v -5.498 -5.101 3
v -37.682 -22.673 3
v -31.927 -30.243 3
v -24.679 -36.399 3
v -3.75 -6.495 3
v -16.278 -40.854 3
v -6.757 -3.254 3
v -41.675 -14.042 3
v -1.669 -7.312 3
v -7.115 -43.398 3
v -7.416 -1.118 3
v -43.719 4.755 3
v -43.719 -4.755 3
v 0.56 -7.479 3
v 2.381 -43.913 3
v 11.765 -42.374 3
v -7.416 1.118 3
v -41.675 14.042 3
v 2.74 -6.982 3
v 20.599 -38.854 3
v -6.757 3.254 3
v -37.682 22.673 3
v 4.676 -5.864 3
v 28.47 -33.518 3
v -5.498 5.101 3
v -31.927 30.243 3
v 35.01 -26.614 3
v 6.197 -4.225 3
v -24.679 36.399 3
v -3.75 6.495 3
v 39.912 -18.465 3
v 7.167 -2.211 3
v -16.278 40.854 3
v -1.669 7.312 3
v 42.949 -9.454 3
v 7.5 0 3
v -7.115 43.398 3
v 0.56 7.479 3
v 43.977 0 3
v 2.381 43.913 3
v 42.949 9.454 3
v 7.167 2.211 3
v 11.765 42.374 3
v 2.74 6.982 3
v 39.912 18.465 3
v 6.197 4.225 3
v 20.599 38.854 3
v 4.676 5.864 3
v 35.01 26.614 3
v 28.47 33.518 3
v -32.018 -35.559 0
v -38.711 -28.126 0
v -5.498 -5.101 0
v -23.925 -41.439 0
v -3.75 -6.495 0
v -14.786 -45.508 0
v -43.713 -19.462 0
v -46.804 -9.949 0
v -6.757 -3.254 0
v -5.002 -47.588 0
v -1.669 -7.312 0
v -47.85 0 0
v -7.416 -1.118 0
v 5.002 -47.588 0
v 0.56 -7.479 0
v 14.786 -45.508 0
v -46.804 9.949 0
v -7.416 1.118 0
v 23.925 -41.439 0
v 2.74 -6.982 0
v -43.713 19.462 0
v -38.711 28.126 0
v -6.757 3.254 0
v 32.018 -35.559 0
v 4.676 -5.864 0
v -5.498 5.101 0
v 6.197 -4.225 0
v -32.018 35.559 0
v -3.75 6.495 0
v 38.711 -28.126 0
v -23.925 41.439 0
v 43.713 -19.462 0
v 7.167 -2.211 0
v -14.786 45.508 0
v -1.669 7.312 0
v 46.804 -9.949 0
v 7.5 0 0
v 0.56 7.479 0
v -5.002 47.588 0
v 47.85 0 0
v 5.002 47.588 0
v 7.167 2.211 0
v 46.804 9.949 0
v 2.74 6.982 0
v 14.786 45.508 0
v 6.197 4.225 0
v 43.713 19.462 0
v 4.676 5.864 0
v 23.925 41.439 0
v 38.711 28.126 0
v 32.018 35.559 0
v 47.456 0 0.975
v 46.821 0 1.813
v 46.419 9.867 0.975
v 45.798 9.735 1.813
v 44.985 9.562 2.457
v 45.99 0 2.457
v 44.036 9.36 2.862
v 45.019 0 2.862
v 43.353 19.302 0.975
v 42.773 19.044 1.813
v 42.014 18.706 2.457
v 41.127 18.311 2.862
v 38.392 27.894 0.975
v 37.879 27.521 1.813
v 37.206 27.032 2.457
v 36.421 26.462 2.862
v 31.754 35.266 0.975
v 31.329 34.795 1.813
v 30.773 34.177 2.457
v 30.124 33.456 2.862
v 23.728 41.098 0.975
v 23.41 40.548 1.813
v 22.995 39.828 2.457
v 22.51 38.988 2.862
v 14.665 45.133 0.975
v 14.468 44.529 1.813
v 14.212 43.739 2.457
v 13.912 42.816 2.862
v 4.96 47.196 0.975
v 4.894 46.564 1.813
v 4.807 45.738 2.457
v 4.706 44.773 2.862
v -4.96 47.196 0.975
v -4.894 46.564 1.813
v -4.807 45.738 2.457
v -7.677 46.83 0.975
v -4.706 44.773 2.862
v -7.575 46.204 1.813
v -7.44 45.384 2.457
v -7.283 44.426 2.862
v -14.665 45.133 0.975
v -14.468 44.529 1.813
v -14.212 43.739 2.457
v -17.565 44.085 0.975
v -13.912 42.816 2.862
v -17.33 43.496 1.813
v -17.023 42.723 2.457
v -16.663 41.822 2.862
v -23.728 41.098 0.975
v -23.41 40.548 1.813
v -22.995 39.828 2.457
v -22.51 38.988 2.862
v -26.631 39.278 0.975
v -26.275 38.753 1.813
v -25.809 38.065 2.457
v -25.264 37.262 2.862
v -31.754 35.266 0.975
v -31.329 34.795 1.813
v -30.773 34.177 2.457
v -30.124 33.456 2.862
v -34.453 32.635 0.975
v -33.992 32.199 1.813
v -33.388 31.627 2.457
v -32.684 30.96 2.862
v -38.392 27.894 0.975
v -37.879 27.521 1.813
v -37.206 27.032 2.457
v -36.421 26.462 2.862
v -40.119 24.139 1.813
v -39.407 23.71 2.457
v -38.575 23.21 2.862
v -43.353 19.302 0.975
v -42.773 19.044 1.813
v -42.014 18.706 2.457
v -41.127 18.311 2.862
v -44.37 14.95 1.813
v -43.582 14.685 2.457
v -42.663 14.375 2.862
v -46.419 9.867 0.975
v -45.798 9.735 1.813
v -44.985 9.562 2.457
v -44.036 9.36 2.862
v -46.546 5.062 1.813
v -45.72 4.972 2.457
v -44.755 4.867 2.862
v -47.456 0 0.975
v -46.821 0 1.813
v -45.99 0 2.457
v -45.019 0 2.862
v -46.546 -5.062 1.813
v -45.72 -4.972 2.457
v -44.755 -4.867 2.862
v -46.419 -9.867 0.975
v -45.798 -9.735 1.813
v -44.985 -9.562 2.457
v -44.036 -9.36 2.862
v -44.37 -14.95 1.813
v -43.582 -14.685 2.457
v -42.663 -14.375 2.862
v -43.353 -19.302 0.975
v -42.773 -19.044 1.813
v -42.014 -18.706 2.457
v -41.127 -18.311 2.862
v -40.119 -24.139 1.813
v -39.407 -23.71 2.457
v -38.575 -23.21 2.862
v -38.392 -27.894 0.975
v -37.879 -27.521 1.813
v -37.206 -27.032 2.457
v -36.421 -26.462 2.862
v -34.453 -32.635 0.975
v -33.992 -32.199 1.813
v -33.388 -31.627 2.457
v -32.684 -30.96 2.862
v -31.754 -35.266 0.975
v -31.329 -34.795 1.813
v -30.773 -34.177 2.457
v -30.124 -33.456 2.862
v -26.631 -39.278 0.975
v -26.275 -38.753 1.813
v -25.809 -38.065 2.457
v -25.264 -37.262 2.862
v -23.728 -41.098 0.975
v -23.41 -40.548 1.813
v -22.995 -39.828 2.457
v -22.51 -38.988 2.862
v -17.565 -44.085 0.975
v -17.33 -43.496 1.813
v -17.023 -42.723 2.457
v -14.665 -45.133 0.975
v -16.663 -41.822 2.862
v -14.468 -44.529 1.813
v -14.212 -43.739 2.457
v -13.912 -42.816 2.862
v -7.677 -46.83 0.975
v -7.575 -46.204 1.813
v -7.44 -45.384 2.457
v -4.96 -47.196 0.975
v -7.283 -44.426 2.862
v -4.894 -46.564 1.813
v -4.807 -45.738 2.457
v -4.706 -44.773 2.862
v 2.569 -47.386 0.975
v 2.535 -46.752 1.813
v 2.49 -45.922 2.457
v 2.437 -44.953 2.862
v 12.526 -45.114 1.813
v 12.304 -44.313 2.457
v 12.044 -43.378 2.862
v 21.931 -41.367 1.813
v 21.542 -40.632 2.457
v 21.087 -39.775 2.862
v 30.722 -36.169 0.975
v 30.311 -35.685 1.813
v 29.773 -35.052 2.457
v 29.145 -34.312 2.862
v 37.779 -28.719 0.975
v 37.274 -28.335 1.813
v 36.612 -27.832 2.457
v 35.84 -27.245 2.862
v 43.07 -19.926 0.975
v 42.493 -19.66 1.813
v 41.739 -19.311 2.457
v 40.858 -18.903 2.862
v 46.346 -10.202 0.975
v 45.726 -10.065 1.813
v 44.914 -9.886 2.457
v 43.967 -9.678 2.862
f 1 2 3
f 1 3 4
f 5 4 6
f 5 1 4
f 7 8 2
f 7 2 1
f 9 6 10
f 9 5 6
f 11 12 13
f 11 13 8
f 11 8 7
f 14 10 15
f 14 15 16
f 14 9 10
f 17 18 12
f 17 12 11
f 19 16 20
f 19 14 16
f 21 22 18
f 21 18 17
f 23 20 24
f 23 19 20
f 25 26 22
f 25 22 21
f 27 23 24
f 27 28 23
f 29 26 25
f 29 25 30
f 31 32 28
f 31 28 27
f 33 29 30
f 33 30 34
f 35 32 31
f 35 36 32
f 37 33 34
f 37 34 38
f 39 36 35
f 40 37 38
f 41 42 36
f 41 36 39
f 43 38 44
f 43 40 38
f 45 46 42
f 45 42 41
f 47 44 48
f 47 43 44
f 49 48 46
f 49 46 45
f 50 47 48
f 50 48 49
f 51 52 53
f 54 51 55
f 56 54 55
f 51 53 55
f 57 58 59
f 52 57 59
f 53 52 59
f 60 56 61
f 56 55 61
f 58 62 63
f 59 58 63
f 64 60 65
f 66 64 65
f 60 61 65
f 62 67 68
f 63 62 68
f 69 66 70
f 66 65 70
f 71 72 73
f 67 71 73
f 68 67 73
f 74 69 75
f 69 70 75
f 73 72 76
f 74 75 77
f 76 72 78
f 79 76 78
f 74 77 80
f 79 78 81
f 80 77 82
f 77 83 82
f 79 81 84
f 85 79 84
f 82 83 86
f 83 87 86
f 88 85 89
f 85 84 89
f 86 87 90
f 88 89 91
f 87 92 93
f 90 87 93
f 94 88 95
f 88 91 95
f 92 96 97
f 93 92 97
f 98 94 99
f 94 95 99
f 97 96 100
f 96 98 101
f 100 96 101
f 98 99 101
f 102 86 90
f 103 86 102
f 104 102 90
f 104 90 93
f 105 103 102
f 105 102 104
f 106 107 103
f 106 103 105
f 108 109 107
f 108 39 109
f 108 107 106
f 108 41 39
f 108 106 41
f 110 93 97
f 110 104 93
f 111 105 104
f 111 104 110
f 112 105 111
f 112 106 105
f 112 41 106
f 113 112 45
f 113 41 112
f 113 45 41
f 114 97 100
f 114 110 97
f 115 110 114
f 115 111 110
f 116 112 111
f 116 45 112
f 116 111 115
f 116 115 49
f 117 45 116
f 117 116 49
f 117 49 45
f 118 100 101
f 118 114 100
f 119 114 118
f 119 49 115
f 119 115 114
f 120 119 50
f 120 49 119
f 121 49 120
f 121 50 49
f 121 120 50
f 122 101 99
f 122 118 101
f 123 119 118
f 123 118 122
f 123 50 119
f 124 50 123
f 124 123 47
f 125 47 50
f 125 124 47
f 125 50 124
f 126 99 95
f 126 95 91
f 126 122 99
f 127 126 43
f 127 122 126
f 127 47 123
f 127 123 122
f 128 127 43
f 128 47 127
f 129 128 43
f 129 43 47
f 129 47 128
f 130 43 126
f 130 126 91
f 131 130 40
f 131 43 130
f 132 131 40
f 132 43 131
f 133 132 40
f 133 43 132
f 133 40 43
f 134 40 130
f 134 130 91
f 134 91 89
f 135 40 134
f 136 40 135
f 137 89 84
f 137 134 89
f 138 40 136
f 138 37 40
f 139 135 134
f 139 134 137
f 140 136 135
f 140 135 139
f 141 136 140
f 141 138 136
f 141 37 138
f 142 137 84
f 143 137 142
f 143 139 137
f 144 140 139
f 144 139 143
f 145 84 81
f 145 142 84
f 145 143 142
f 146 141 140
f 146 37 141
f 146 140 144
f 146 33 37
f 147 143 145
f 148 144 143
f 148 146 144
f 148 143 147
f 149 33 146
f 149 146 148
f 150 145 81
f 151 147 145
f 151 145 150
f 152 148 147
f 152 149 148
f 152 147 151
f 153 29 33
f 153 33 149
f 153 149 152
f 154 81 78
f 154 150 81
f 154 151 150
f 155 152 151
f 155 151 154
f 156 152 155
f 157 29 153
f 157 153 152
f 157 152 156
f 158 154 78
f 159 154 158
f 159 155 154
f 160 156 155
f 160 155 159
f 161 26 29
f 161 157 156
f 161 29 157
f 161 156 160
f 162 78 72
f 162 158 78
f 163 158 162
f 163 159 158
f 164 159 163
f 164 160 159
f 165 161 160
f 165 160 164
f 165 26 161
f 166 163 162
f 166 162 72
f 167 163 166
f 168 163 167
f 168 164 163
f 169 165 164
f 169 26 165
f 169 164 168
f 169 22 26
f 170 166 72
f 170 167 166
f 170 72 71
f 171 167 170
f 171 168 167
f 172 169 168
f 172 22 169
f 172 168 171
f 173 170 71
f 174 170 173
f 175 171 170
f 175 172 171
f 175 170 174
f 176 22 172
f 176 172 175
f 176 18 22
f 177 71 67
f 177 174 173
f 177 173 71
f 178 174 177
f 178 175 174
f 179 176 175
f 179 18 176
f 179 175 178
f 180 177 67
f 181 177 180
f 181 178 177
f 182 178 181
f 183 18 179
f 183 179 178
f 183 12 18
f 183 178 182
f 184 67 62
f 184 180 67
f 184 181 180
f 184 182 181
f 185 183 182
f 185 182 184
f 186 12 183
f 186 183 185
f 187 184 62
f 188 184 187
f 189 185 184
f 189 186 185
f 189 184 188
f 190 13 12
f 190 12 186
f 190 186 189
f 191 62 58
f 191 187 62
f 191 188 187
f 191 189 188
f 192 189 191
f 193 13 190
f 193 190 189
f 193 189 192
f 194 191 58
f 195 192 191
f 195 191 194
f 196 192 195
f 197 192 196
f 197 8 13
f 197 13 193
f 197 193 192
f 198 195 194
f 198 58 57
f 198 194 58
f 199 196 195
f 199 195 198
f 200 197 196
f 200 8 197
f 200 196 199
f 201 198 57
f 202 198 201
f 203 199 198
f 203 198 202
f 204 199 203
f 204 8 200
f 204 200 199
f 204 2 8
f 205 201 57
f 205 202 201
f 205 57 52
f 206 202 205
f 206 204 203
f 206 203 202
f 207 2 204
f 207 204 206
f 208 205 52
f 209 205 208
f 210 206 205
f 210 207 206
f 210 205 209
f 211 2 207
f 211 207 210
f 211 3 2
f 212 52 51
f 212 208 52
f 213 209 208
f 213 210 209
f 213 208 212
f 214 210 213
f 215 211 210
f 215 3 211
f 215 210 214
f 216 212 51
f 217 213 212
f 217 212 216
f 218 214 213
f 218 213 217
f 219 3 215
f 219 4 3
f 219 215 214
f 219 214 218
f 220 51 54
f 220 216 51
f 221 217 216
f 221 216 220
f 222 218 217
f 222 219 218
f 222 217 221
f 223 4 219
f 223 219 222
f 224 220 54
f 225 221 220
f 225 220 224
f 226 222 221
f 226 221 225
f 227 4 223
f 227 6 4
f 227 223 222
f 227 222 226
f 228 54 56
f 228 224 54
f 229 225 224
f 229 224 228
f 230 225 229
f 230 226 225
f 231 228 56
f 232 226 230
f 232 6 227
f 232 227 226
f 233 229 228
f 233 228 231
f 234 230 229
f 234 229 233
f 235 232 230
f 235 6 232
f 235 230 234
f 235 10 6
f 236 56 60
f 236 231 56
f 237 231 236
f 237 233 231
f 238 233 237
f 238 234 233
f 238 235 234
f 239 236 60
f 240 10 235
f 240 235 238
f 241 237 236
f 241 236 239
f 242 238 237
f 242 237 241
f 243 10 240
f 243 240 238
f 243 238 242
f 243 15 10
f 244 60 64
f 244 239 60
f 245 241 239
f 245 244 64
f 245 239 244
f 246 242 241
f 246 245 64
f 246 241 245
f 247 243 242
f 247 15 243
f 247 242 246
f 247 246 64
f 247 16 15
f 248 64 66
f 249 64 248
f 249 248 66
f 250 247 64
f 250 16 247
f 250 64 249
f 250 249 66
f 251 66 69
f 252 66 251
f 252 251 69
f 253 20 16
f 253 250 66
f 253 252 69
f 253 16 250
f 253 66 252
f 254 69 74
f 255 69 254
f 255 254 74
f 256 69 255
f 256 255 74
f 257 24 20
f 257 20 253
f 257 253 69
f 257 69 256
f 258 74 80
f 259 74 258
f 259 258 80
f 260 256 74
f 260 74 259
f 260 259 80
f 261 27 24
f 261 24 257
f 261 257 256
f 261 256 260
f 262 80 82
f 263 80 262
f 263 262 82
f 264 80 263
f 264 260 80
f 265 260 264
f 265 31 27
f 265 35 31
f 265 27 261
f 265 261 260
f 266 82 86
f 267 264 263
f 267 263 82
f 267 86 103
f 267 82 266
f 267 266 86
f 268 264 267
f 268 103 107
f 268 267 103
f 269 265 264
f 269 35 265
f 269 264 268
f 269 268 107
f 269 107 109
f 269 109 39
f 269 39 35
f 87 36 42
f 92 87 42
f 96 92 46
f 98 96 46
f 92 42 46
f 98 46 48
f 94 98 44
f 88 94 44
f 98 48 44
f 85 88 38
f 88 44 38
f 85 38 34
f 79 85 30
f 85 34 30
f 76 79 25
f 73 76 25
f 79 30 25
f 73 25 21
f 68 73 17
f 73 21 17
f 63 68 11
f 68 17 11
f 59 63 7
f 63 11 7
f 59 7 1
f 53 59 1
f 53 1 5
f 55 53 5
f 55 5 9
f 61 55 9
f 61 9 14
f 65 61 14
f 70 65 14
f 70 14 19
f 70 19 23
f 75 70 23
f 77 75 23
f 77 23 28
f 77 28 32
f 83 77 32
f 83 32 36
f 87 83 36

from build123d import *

# Parameters (mm, degrees)
SKETCH1_R           = 47.85
BOSS_EXTRUDE1_DEPTH = 3
SKETCH2_R           = 7.5
CUT_EXTRUDE1_DEPTH  = 6
FILLET2_R           = 4


with BuildPart() as part:
    # Sketch1 → Boss-Extrude1 (new body)
    with BuildSketch(Plane.XY):
        Circle(SKETCH1_R)
    extrude(amount=BOSS_EXTRUDE1_DEPTH)

    # Sketch2 → Cut-Extrude1 (cut)
    with BuildSketch(Plane.XY.offset(3)):
        Circle(SKETCH2_R)
    extrude(amount=-CUT_EXTRUDE1_DEPTH, mode=Mode.SUBTRACT)

    # Fillet2
    # the kernel refuses this fillet: 4 mm, written as the material it takes off along each edge
    with BuildSketch(Plane(origin=(0, 0, 3), x_dir=(1, 0, 0), z_dir=(0, -1, 0))) as fillet2_piece_1:
        with BuildLine():
            CenterArc((43.977016654, -4), FILLET2_R, 14.477512186, 75.522487814)
            Line((43.977016654, 0), (43.977016654, 0.08))
            Line((43.977016654, 0.08), (47.85, 0.08))
            Line((47.85, 0.08), (47.93, 0))
            ThreePointArc((47.93, 0), (47.93, -1.5), (47.927459667, -2.98))
            Line((47.927459667, -2.98), (47.85, -3))
        make_face()
    revolve(axis=Axis((0, 0, 3), (0, 0, 1)), mode=Mode.SUBTRACT)


solid = part.part
